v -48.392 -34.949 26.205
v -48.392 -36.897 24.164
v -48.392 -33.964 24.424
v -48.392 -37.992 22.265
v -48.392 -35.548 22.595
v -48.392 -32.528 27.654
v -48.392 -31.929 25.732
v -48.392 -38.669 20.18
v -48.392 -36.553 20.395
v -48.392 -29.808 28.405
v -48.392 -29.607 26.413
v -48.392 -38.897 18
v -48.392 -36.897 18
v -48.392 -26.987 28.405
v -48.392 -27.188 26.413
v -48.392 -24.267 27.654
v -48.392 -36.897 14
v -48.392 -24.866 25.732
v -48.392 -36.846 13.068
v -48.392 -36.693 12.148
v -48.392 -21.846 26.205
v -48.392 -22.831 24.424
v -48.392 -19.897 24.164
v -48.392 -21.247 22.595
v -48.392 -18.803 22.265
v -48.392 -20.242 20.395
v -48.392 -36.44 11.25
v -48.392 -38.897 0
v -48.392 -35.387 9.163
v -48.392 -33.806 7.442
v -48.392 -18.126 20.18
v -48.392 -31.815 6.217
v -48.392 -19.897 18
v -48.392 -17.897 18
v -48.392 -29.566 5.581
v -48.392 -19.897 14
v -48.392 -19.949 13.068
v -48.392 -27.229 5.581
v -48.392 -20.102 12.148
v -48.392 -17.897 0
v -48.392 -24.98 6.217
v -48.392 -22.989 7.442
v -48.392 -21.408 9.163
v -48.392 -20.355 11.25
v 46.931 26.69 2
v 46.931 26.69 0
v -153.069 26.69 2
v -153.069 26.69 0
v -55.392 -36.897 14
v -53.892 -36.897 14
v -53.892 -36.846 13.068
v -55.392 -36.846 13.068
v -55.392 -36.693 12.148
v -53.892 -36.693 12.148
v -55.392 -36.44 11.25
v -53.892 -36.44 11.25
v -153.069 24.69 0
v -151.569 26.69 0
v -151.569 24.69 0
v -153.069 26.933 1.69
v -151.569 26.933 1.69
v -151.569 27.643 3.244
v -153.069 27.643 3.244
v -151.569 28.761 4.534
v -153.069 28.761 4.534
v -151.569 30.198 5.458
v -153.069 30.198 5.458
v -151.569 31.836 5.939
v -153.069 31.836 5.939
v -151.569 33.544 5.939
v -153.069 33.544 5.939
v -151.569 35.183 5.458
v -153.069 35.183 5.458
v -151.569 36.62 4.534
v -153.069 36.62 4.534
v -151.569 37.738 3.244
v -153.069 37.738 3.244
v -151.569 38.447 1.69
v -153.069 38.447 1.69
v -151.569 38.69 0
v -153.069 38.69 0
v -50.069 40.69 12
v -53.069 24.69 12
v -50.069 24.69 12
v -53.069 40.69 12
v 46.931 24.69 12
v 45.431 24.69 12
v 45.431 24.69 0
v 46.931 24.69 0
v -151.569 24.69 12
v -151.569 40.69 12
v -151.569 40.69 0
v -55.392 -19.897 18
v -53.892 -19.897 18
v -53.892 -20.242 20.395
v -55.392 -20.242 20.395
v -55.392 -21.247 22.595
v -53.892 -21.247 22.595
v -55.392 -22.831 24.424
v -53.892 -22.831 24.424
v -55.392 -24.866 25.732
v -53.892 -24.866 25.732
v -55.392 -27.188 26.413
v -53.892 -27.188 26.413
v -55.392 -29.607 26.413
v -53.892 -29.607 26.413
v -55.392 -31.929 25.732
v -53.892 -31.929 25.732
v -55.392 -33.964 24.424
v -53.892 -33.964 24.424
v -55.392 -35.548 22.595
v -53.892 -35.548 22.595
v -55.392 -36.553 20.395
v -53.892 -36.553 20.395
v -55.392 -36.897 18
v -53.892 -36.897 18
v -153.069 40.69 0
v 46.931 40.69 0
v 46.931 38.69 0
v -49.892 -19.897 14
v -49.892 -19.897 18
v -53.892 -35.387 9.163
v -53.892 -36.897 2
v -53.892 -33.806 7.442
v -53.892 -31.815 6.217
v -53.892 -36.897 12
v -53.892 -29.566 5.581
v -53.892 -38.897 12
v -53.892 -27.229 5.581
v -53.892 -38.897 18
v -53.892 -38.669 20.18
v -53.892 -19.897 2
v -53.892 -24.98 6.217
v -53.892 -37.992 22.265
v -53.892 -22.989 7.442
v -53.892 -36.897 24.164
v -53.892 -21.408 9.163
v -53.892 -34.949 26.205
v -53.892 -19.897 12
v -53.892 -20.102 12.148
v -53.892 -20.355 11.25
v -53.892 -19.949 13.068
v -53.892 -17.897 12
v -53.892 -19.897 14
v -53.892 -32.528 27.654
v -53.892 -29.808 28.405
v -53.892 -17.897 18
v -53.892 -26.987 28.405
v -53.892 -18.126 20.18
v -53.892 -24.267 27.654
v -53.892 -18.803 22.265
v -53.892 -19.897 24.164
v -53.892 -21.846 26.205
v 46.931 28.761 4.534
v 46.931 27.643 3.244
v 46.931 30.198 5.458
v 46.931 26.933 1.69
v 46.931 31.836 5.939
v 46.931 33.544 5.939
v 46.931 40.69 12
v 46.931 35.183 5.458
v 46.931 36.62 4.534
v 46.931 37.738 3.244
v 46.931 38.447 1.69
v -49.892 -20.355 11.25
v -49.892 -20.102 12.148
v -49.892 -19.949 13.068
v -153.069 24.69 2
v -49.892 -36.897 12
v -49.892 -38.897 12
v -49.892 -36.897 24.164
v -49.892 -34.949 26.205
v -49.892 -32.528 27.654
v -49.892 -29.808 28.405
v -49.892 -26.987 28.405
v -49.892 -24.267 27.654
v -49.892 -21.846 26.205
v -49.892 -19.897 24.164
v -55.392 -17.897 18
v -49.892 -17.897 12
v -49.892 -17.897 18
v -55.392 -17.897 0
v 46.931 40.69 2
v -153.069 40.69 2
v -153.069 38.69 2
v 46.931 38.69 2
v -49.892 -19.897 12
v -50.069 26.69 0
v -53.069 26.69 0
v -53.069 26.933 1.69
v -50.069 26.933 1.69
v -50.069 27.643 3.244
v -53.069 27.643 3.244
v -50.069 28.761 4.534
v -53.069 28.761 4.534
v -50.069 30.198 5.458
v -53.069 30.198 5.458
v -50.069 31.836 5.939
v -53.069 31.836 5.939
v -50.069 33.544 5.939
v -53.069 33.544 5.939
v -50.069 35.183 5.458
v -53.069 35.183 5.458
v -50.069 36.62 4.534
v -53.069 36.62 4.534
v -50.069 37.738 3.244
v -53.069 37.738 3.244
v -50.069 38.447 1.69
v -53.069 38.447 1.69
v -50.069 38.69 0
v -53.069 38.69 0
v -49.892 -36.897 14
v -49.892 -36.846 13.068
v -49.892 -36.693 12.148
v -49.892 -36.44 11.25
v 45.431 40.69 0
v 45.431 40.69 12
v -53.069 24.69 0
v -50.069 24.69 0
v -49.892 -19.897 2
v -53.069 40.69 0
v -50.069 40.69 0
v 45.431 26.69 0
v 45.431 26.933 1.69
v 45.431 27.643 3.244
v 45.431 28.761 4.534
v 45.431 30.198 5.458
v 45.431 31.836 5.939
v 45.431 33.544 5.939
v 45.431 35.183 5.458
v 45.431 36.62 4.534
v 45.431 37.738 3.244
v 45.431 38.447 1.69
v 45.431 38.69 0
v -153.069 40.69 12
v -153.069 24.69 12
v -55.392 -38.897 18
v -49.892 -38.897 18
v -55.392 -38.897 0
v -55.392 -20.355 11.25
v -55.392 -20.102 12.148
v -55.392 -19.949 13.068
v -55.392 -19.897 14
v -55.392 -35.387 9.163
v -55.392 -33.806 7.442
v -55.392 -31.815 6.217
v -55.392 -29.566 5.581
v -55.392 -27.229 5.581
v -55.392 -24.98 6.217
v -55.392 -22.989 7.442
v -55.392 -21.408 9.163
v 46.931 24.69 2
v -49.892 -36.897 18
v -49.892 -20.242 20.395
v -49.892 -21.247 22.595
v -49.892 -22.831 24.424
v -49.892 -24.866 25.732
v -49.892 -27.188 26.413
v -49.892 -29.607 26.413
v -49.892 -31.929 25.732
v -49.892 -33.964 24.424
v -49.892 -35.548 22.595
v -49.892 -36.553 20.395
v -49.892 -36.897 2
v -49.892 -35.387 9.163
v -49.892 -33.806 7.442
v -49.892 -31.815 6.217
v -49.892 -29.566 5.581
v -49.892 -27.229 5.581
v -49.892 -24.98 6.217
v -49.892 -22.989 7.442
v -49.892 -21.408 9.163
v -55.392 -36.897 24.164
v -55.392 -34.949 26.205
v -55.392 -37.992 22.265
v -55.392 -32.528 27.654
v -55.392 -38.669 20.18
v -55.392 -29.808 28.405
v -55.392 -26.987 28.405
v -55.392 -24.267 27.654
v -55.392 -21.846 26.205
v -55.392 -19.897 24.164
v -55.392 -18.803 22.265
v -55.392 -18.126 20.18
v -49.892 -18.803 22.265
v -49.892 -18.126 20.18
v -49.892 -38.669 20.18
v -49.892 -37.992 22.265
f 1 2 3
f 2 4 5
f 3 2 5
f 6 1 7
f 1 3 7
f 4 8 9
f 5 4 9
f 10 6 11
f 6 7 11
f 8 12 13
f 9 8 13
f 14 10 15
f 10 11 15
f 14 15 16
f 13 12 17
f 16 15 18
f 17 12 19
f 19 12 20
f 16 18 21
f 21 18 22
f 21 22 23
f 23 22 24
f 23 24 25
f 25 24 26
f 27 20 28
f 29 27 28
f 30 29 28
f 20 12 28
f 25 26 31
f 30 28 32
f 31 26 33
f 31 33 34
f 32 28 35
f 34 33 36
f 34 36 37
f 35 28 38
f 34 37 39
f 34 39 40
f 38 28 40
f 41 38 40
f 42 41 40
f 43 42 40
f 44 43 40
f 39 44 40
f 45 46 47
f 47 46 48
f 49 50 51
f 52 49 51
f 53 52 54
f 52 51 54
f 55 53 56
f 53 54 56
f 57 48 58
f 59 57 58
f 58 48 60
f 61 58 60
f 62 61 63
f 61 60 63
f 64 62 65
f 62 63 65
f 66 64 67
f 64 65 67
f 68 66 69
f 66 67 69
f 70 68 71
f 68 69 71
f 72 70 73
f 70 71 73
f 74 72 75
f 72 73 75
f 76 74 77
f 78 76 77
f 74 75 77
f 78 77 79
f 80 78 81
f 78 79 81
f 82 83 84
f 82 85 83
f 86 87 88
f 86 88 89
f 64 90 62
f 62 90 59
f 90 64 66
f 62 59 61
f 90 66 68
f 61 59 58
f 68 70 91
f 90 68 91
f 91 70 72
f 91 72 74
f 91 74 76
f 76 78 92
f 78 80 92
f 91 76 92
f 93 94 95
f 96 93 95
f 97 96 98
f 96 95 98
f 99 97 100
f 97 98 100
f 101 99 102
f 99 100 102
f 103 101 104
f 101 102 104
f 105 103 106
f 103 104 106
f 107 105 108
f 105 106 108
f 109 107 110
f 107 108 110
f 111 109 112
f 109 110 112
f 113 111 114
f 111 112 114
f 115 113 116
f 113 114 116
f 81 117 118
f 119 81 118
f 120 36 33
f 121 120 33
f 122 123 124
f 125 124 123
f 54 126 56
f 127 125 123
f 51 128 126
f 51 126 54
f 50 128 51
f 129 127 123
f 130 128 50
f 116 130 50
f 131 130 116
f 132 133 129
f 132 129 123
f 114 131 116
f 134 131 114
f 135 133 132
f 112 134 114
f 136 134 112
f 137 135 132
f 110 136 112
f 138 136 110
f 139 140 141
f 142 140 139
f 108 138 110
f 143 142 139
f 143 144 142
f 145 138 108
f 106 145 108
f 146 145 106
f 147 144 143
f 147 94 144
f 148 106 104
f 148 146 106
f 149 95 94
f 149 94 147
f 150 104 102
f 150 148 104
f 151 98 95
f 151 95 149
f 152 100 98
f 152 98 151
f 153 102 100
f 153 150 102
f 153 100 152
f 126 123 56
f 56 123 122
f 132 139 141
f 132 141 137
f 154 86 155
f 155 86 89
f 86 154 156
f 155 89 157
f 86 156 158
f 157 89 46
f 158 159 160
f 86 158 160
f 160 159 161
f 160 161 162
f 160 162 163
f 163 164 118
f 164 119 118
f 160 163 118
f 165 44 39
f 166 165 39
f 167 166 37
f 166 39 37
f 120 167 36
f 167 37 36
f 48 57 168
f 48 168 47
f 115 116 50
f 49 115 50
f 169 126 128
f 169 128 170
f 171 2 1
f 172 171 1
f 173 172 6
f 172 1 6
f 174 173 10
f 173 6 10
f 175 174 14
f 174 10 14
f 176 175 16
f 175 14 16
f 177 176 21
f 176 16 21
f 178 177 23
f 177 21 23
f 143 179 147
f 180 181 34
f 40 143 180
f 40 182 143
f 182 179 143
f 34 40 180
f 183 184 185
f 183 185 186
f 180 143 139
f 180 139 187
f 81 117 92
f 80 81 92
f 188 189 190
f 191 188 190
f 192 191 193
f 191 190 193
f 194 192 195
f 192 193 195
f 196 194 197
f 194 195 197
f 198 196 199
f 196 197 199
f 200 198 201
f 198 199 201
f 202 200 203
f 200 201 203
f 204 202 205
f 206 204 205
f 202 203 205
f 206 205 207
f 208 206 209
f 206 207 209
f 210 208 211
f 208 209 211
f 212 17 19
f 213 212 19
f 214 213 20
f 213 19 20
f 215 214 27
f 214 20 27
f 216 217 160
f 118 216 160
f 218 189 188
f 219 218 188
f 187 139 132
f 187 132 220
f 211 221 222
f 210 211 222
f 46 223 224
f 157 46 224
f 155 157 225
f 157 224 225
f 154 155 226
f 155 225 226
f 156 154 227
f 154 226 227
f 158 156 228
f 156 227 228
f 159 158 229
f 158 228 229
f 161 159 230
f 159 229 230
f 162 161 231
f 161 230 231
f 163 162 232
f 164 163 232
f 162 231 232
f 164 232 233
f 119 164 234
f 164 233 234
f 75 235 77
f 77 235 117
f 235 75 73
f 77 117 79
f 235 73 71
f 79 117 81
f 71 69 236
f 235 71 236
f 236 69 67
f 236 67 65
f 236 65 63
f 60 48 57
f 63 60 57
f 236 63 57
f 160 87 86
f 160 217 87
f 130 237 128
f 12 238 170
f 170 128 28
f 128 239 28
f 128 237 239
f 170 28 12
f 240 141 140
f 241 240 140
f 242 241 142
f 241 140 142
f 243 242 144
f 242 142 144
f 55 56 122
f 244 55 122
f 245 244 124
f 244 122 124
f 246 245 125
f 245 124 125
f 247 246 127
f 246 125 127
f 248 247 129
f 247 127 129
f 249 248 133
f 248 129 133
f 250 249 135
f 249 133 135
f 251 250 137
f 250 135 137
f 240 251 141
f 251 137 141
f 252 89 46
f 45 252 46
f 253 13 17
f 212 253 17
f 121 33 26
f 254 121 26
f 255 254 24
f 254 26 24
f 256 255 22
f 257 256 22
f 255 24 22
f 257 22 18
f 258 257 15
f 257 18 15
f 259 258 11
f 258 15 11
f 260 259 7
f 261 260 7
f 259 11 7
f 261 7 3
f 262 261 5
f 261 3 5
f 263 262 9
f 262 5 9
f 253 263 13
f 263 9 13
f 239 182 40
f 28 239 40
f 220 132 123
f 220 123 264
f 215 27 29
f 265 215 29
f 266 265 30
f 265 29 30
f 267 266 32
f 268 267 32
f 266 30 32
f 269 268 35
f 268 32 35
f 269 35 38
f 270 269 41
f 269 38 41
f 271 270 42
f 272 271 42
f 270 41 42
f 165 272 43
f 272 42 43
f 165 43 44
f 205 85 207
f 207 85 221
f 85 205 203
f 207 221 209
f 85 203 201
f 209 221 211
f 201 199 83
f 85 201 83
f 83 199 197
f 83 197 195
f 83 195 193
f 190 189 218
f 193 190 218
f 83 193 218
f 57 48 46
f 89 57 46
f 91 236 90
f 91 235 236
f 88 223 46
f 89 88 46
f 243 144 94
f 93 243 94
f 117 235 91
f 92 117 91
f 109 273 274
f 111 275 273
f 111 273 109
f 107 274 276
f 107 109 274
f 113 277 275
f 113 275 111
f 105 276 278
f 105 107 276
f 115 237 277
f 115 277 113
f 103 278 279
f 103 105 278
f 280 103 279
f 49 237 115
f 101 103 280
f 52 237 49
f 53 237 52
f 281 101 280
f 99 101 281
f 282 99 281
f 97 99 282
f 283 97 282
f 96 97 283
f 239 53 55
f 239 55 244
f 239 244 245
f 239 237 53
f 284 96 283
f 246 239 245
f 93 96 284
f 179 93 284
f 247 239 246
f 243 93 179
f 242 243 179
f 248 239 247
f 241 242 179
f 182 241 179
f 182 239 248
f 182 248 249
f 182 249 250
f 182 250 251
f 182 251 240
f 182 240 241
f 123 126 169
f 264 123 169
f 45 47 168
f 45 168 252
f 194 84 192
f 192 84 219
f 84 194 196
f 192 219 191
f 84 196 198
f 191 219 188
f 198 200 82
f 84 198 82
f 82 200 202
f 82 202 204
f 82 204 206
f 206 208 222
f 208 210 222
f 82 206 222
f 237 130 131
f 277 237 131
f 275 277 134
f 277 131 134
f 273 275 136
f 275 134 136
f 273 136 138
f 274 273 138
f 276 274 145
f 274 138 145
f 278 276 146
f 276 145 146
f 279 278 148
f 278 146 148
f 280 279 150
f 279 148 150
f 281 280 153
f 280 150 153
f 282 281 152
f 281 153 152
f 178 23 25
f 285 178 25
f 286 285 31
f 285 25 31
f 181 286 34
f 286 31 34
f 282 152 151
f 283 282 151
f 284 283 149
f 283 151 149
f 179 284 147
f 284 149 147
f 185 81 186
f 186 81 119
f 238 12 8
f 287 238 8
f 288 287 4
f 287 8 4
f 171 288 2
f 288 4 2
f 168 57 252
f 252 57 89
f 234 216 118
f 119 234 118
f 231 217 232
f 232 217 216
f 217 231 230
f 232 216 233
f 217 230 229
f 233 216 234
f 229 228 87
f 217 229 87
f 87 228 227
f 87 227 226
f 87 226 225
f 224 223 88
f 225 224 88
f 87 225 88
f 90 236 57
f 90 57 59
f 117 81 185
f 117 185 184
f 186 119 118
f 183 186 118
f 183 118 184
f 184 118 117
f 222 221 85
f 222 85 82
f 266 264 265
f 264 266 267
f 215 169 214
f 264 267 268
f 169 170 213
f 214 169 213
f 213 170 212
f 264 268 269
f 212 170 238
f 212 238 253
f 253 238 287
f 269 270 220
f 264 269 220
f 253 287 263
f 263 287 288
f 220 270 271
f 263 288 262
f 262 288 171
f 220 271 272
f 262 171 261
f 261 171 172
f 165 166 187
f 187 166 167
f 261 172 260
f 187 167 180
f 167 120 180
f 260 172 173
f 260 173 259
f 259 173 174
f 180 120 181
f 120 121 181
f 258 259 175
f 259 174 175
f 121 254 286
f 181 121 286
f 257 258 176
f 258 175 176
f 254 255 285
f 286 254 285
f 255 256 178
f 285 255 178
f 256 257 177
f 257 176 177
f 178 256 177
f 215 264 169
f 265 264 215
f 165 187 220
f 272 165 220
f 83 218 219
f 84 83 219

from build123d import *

# Parameters (mm, degrees)
F2_W      = 98.5
F2_H      = 2
F2_W_2    = 3
F2_W_3    = 95.5
F2_W_4    = 1.5
F3_DEPTH  = 2
F2_H_2    = 12
F4_DEPTH  = 12
F6_DEPTH  = 200.001
F7_W      = 7
F7_H      = 21
F8_DEPTH  = 36
F9_W      = 4
F9_H      = 17
F10_DEPTH = 34
F9_H_2    = 2
F11_DEPTH = 24
F13_DEPTH = 104.6787827614


with BuildPart() as f3:
    # F2 (on Top) → F3 (new body)
    with BuildSketch(Plane.XY):
        with Locations((-102.3193546855, 39.6903362217)):
            Rectangle(F2_W, F2_H)
        with Locations((-51.5693546855, 39.6903362217)):
            Rectangle(F2_W_2, F2_H)
        with Locations((-2.3193546855, 39.6903362217)):
            Rectangle(F2_W_3, F2_H)
        with Locations((-152.3193546855, 39.6903362217)):
            Rectangle(F2_W_4, F2_H)
        with Locations((46.1806453145, 39.6903362217)):
            Rectangle(F2_W_4, F2_H)
    extrude(amount=F3_DEPTH)


with BuildPart() as f3b:
    # F2 (on Top) → F3, piece 2 (new body)
    with BuildSketch(Plane.XY):
        with Locations((46.1806453145, 25.6903362217)):
            Rectangle(F2_W_4, F2_H)
        with Locations((-2.3193546855, 25.6903362217)):
            Rectangle(F2_W_3, F2_H)
        with Locations((-51.5693546855, 25.6903362217)):
            Rectangle(F2_W_2, F2_H)
        with Locations((-102.3193546855, 25.6903362217)):
            Rectangle(F2_W, F2_H)
        with Locations((-152.3193546855, 25.6903362217)):
            Rectangle(F2_W_4, F2_H)
    extrude(amount=F3_DEPTH)


with BuildPart() as f4:
    # F2 (on Top) → F4 (new body)
    with BuildSketch(Plane.XY):
        with Locations((-152.3193546855, 32.6903362217)):
            Rectangle(F2_W_4, F2_H_2)
        with Locations((-152.3193546855, 25.6903362217)):
            Rectangle(F2_W_4, F2_H)
        with Locations((-152.3193546855, 39.6903362217)):
            Rectangle(F2_W_4, F2_H)
    extrude(amount=F4_DEPTH)


with BuildPart() as f4b:
    # F2 (on Top) → F4, piece 2 (new body)
    with BuildSketch(Plane.XY):
        with Locations((-51.5693546855, 32.6903362217)):
            Rectangle(F2_W_2, F2_H_2)
        with Locations((-51.5693546855, 25.6903362217)):
            Rectangle(F2_W_2, F2_H)
        with Locations((-51.5693546855, 39.6903362217)):
            Rectangle(F2_W_2, F2_H)
    extrude(amount=F4_DEPTH)


with BuildPart() as f4c:
    # F2 (on Top) → F4, piece 3 (new body)
    with BuildSketch(Plane.XY):
        with Locations((46.1806453145, 32.6903362217)):
            Rectangle(F2_W_4, F2_H_2)
        with Locations((46.1806453145, 25.6903362217)):
            Rectangle(F2_W_4, F2_H)
        with Locations((46.1806453145, 39.6903362217)):
            Rectangle(F2_W_4, F2_H)
    extrude(amount=F4_DEPTH)


with BuildPart() as f6_tool:
    # F5 (on face) → F6 (new body, through all)
    with BuildSketch(Plane(origin=(-153.0693546855, 0, 0), x_dir=(0, -1, 0), z_dir=(-1, 0, 0))):
        with BuildLine():
            Line((-38.6903362217, 0), (-26.6903362217, 0))
            ThreePointArc((-26.6903362217, 0), (-32.6903362217, 6), (-38.6903362217, 0))
        make_face()
    extrude(amount=-F6_DEPTH)


with BuildPart() as f4_1:
    add(f4.part)

    # F6: cut by f6_tool
    add(f6_tool.part, mode=Mode.SUBTRACT)


with BuildPart() as f4b_1:
    add(f4b.part)

    # F6: cut by f6_tool
    add(f6_tool.part, mode=Mode.SUBTRACT)


with BuildPart() as f4c_1:
    add(f4c.part)

    # F6: cut by f6_tool
    add(f6_tool.part, mode=Mode.SUBTRACT)


with BuildPart() as f8:
    # F7 (on Top) → F8 (new body)
    with BuildSketch(Plane.XY):
        with Locations((-51.8915719241, -28.3974884252)):
            Rectangle(F7_W, F7_H)
    extrude(amount=F8_DEPTH)

    # F9 (on face) → F10 (cut)
    with BuildSketch(Plane.XY.offset(36)):
        with Locations((-51.8915719241, -28.3974884252)):
            Rectangle(F9_W, F9_H)
    extrude(amount=-F10_DEPTH, mode=Mode.SUBTRACT)

    # F9 (on face) → F11 (cut)
    with BuildSketch(Plane.XY.offset(36)):
        with Locations((-51.8915719241, -37.8974884252)):
            Rectangle(F9_W, F9_H_2)
        with Locations((-51.8915719241, -18.8974884252)):
            Rectangle(F9_W, F9_H_2)
    extrude(amount=-F11_DEPTH, mode=Mode.SUBTRACT)

    # F12 (on face) → F13 (cut, through all)
    with BuildSketch(Plane.YZ.offset(-48.3915719241)):
        with BuildLine():
            ThreePointArc((-20.3546344542, 11.25), (-28.3974884252, 7.5), (-36.4403423963, 11.25))
            ThreePointArc((-36.4403423963, 11.25), (-28.3974884252, 5.5), (-20.3546344542, 11.25))
        make_face()
        with BuildLine():
            Line((-35.8974884252, 14), (-36.8974884252, 14))
            ThreePointArc((-36.8974884252, 14), (-36.7824230927, 12.6061310596), (-36.4403423963, 11.25))
            ThreePointArc((-36.4403423963, 11.25), (-28.3974884252, 7.5), (-20.3546344542, 11.25))
            ThreePointArc((-20.3546344542, 11.25), (-20.0125537578, 12.6061310596), (-19.8974884252, 14))
            Line((-19.8974884252, 14), (-20.8974884252, 14))
            ThreePointArc((-20.8974884252, 14), (-28.3974884252, 9.5), (-35.8974884252, 14))
        make_face()
        with BuildLine():
            Line((-20.8974884252, 14), (-35.8974884252, 14))
            ThreePointArc((-35.8974884252, 14), (-28.3974884252, 9.5), (-20.8974884252, 14))
        make_face()
        with BuildLine():
            Line((-20.8974884252, 18), (-35.8974884252, 18))
            ThreePointArc((-35.8974884252, 18), (-36.3413592908, 17.0240561621), (-36.6588442462, 16))
            ThreePointArc((-36.6588442462, 16), (-36.3413592908, 14.9759438379), (-35.8974884252, 14))
            Line((-35.8974884252, 14), (-20.8974884252, 14))
            ThreePointArc((-20.8974884252, 14), (-20.4536175597, 14.9759438379), (-20.1361326043, 16))
            ThreePointArc((-20.1361326043, 16), (-20.4536175597, 17.0240561621), (-20.8974884252, 18))
        make_face()
        with BuildLine():
            Line((-35.8974884252, 18), (-36.8974884252, 18))
            ThreePointArc((-36.8974884252, 18), (-36.837616519, 16.9929062799), (-36.6588442462, 16))
            ThreePointArc((-36.6588442462, 16), (-36.3413592908, 17.0240561621), (-35.8974884252, 18))
        make_face()
        with BuildLine():
            ThreePointArc((-20.8974884252, 18), (-28.3974884252, 22.5), (-35.8974884252, 18))
            Line((-35.8974884252, 18), (-20.8974884252, 18))
        make_face()
        with BuildLine():
            Line((-20.8974884252, 14), (-19.8974884252, 14))
            ThreePointArc((-19.8974884252, 14), (-19.9573603315, 15.0070937201), (-20.1361326043, 16))
            ThreePointArc((-20.1361326043, 16), (-20.4536175597, 14.9759438379), (-20.8974884252, 14))
        make_face()
        with BuildLine():
            Line((-19.8974884252, 14), (-19.8974884252, 18))
            ThreePointArc((-19.8974884252, 18), (-19.9573603315, 16.9929062799), (-20.1361326043, 16))
            ThreePointArc((-20.1361326043, 16), (-19.9573603315, 15.0070937201), (-19.8974884252, 14))
        make_face()
        with BuildLine():
            ThreePointArc((-20.1361326043, 16), (-19.9573603315, 16.9929062799), (-19.8974884252, 18))
            Line((-19.8974884252, 18), (-20.8974884252, 18))
            ThreePointArc((-20.8974884252, 18), (-20.4536175597, 17.0240561621), (-20.1361326043, 16))
        make_face()
        with BuildLine():
            ThreePointArc((-19.8974884252, 18), (-28.3974884252, 26.5), (-36.8974884252, 18))
            Line((-36.8974884252, 18), (-35.8974884252, 18))
            ThreePointArc((-35.8974884252, 18), (-28.3974884252, 22.5), (-20.8974884252, 18))
            Line((-20.8974884252, 18), (-19.8974884252, 18))
        make_face()
        with BuildLine():
            ThreePointArc((-36.6588442462, 16), (-36.837616519, 16.9929062799), (-36.8974884252, 18))
            Line((-36.8974884252, 18), (-36.8974884252, 14))
            ThreePointArc((-36.8974884252, 14), (-36.837616519, 15.0070937201), (-36.6588442462, 16))
        make_face()
        with BuildLine():
            ThreePointArc((-36.6588442462, 16), (-36.837616519, 15.0070937201), (-36.8974884252, 14))
            Line((-36.8974884252, 14), (-35.8974884252, 14))
            ThreePointArc((-35.8974884252, 14), (-36.3413592908, 14.9759438379), (-36.6588442462, 16))
        make_face()
        with BuildLine():
            Line((-36.8974884252, 24.164414003), (-36.8974884252, 36))
            Line((-36.8974884252, 36), (-38.8974884252, 36))
            Line((-38.8974884252, 36), (-38.8974884252, 18))
            ThreePointArc((-38.8974884252, 18), (-38.3849806029, 21.2403703492), (-36.8974884252, 24.164414003))
        make_face()
        with BuildLine():
            Line((-19.8974884252, 36), (-36.8974884252, 36))
            Line((-36.8974884252, 36), (-36.8974884252, 24.164414003))
            ThreePointArc((-36.8974884252, 24.164414003), (-28.3974884252, 28.5), (-19.8974884252, 24.164414003))
            Line((-19.8974884252, 24.164414003), (-19.8974884252, 36))
        make_face()
        with BuildLine():
            Line((-17.8974884252, 36), (-19.8974884252, 36))
            Line((-19.8974884252, 36), (-19.8974884252, 24.164414003))
            ThreePointArc((-19.8974884252, 24.164414003), (-18.4099962475, 21.2403703492), (-17.8974884252, 18))
            Line((-17.8974884252, 18), (-17.8974884252, 36))
        make_face()
    extrude(amount=-F13_DEPTH, mode=Mode.SUBTRACT)


solid = Compound([f3.part, f3b.part, f4_1.part, f4b_1.part, f4c_1.part, f8.part])
